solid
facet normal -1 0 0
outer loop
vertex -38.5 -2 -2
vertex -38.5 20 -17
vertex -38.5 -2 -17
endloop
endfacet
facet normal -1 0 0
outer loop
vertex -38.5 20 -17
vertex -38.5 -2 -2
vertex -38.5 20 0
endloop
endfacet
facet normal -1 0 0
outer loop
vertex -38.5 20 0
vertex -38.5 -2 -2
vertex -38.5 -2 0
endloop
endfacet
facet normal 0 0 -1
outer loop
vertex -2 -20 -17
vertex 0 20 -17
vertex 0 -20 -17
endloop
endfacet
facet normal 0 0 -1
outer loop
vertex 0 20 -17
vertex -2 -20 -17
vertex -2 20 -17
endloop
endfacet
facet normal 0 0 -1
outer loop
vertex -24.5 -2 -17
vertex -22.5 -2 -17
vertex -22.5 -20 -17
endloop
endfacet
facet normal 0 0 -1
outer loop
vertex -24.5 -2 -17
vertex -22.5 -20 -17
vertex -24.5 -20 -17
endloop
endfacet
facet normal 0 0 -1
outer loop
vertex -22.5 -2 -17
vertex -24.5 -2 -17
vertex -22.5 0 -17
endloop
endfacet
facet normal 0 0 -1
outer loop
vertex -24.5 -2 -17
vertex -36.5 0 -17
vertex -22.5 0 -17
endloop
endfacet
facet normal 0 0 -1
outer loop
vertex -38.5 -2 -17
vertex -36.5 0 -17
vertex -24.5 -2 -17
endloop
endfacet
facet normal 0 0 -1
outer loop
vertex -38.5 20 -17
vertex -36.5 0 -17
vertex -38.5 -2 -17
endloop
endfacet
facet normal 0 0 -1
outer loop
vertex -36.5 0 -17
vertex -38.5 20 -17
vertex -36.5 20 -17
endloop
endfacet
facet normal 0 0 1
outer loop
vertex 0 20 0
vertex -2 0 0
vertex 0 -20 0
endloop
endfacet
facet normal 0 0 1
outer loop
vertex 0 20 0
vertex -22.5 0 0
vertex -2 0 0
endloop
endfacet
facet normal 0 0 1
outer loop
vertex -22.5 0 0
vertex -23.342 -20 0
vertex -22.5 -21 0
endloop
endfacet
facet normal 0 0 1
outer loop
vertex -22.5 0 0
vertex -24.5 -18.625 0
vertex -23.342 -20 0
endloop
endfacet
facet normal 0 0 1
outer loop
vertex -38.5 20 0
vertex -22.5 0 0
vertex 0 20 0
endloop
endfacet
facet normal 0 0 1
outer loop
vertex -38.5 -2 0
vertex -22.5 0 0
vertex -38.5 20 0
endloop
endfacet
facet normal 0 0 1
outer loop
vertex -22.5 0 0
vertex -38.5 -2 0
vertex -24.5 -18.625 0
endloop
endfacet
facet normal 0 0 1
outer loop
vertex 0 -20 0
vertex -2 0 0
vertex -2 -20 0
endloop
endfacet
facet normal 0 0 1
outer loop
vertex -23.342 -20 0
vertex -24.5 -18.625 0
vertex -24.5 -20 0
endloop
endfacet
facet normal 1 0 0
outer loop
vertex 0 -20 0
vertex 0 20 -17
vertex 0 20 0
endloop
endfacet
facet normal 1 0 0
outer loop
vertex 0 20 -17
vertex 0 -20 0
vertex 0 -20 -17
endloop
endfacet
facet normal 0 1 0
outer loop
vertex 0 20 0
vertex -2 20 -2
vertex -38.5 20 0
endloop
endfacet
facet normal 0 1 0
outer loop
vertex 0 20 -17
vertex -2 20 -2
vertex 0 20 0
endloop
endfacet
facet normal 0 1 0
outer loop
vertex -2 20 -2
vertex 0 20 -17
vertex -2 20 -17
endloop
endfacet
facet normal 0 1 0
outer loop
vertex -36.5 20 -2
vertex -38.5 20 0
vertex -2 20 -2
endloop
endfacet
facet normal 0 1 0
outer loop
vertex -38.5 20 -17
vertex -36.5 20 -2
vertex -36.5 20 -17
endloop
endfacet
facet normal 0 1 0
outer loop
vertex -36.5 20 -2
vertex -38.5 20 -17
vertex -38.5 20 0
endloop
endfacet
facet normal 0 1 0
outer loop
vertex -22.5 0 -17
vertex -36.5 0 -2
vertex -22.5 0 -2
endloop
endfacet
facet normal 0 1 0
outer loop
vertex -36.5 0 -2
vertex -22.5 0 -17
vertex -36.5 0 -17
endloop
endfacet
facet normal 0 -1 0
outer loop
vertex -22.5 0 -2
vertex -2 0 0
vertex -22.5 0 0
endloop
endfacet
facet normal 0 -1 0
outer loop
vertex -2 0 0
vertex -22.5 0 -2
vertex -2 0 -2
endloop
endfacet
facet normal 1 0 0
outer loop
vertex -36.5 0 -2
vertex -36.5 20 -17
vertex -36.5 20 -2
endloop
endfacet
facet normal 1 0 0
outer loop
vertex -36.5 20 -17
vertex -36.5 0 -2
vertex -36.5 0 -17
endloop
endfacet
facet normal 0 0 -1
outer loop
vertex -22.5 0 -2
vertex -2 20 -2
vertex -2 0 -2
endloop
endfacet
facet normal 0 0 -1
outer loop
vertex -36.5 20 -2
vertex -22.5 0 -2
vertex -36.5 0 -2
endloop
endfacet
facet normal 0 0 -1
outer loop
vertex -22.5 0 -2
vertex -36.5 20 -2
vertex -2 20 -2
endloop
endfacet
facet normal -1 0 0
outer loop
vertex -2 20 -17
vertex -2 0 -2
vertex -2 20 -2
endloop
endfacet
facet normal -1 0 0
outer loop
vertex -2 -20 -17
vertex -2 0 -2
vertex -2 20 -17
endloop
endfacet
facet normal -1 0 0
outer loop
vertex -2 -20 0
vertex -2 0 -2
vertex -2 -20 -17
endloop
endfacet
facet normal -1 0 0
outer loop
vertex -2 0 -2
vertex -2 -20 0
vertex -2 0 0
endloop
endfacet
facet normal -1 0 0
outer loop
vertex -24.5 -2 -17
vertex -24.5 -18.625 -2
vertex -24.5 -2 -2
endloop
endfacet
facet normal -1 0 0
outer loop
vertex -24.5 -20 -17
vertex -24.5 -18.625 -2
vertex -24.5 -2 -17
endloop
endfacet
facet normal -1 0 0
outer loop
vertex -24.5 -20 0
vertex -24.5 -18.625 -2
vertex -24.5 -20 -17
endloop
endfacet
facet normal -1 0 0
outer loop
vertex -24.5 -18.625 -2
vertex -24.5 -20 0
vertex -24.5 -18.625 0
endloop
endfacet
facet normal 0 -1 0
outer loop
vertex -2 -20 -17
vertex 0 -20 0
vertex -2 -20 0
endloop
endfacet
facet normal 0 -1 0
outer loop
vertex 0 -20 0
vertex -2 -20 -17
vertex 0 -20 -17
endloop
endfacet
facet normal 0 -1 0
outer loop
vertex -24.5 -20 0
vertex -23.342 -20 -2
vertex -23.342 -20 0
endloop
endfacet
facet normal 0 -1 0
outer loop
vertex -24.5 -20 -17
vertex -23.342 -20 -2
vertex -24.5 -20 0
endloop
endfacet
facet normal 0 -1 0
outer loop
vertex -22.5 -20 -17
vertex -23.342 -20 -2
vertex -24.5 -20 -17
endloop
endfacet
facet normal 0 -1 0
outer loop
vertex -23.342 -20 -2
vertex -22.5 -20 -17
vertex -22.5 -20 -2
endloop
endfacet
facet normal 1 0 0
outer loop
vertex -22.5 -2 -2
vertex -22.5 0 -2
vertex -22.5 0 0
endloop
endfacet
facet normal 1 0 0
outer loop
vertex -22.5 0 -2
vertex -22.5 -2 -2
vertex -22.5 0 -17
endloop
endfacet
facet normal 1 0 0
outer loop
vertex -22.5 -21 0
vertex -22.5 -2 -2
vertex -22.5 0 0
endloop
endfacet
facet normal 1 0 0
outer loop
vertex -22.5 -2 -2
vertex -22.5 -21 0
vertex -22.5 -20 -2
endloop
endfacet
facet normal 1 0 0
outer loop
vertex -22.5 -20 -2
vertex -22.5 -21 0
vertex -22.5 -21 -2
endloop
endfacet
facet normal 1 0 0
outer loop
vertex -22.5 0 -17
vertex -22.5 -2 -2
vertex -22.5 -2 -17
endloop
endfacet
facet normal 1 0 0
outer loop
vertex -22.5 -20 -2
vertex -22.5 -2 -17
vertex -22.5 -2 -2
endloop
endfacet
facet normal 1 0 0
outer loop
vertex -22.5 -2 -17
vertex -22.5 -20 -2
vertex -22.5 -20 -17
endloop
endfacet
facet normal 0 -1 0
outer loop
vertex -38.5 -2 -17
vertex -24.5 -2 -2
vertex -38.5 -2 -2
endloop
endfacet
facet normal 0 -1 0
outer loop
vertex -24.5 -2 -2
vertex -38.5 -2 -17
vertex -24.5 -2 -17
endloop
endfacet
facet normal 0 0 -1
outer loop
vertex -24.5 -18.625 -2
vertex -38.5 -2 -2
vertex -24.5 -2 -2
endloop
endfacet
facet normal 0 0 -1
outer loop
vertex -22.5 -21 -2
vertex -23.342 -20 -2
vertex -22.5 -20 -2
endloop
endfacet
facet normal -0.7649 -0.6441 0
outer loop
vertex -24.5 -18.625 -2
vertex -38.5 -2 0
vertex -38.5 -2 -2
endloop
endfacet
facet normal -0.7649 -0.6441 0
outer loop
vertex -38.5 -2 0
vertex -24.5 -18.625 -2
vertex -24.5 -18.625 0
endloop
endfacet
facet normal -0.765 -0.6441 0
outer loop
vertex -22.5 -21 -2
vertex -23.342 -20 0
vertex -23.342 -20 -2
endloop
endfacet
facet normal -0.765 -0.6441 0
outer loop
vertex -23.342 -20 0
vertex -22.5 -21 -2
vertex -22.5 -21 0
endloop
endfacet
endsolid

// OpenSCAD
hoogte = 15;        // hoogte van klem
overlap = 40;       // totale lengte
stijl = 20.5;
lijst = 34.5;
dikte = 2;

lijst(lijst);
translate([0, -overlap / 2, 0]) lijst(stijl,top=false );
vulPlaat();

module lijst(b = lijst, top = true) {
    rotate([0, 180, 0])
    difference() {
        cube([b + dikte * 2, overlap / 2, hoogte + dikte]);
        if (top) {
            translate([dikte, dikte - overlap / 2, dikte])
            cube([b, overlap , hoogte * 2]);
        } else {
            translate([dikte, dikte - overlap / 2, -dikte])
            cube([b, overlap , hoogte * 2]);
        }
    }
}

module vulPlaat() {
    translate([-(lijst + dikte * 2),- dikte, -(hoogte + dikte) ])
    cube([lijst - stijl + dikte, dikte, hoogte + dikte]);
    x1 = -(stijl + dikte);
    x2 = -(lijst + dikte * 2);
    y1 = -dikte;
    y2 = -(overlap + dikte)/ 2;
    translate([0, 0, -dikte])
    linear_extrude(height = dikte) 
    polygon([[x1, y1],[x1, y2],[x2, y1]]);
}
